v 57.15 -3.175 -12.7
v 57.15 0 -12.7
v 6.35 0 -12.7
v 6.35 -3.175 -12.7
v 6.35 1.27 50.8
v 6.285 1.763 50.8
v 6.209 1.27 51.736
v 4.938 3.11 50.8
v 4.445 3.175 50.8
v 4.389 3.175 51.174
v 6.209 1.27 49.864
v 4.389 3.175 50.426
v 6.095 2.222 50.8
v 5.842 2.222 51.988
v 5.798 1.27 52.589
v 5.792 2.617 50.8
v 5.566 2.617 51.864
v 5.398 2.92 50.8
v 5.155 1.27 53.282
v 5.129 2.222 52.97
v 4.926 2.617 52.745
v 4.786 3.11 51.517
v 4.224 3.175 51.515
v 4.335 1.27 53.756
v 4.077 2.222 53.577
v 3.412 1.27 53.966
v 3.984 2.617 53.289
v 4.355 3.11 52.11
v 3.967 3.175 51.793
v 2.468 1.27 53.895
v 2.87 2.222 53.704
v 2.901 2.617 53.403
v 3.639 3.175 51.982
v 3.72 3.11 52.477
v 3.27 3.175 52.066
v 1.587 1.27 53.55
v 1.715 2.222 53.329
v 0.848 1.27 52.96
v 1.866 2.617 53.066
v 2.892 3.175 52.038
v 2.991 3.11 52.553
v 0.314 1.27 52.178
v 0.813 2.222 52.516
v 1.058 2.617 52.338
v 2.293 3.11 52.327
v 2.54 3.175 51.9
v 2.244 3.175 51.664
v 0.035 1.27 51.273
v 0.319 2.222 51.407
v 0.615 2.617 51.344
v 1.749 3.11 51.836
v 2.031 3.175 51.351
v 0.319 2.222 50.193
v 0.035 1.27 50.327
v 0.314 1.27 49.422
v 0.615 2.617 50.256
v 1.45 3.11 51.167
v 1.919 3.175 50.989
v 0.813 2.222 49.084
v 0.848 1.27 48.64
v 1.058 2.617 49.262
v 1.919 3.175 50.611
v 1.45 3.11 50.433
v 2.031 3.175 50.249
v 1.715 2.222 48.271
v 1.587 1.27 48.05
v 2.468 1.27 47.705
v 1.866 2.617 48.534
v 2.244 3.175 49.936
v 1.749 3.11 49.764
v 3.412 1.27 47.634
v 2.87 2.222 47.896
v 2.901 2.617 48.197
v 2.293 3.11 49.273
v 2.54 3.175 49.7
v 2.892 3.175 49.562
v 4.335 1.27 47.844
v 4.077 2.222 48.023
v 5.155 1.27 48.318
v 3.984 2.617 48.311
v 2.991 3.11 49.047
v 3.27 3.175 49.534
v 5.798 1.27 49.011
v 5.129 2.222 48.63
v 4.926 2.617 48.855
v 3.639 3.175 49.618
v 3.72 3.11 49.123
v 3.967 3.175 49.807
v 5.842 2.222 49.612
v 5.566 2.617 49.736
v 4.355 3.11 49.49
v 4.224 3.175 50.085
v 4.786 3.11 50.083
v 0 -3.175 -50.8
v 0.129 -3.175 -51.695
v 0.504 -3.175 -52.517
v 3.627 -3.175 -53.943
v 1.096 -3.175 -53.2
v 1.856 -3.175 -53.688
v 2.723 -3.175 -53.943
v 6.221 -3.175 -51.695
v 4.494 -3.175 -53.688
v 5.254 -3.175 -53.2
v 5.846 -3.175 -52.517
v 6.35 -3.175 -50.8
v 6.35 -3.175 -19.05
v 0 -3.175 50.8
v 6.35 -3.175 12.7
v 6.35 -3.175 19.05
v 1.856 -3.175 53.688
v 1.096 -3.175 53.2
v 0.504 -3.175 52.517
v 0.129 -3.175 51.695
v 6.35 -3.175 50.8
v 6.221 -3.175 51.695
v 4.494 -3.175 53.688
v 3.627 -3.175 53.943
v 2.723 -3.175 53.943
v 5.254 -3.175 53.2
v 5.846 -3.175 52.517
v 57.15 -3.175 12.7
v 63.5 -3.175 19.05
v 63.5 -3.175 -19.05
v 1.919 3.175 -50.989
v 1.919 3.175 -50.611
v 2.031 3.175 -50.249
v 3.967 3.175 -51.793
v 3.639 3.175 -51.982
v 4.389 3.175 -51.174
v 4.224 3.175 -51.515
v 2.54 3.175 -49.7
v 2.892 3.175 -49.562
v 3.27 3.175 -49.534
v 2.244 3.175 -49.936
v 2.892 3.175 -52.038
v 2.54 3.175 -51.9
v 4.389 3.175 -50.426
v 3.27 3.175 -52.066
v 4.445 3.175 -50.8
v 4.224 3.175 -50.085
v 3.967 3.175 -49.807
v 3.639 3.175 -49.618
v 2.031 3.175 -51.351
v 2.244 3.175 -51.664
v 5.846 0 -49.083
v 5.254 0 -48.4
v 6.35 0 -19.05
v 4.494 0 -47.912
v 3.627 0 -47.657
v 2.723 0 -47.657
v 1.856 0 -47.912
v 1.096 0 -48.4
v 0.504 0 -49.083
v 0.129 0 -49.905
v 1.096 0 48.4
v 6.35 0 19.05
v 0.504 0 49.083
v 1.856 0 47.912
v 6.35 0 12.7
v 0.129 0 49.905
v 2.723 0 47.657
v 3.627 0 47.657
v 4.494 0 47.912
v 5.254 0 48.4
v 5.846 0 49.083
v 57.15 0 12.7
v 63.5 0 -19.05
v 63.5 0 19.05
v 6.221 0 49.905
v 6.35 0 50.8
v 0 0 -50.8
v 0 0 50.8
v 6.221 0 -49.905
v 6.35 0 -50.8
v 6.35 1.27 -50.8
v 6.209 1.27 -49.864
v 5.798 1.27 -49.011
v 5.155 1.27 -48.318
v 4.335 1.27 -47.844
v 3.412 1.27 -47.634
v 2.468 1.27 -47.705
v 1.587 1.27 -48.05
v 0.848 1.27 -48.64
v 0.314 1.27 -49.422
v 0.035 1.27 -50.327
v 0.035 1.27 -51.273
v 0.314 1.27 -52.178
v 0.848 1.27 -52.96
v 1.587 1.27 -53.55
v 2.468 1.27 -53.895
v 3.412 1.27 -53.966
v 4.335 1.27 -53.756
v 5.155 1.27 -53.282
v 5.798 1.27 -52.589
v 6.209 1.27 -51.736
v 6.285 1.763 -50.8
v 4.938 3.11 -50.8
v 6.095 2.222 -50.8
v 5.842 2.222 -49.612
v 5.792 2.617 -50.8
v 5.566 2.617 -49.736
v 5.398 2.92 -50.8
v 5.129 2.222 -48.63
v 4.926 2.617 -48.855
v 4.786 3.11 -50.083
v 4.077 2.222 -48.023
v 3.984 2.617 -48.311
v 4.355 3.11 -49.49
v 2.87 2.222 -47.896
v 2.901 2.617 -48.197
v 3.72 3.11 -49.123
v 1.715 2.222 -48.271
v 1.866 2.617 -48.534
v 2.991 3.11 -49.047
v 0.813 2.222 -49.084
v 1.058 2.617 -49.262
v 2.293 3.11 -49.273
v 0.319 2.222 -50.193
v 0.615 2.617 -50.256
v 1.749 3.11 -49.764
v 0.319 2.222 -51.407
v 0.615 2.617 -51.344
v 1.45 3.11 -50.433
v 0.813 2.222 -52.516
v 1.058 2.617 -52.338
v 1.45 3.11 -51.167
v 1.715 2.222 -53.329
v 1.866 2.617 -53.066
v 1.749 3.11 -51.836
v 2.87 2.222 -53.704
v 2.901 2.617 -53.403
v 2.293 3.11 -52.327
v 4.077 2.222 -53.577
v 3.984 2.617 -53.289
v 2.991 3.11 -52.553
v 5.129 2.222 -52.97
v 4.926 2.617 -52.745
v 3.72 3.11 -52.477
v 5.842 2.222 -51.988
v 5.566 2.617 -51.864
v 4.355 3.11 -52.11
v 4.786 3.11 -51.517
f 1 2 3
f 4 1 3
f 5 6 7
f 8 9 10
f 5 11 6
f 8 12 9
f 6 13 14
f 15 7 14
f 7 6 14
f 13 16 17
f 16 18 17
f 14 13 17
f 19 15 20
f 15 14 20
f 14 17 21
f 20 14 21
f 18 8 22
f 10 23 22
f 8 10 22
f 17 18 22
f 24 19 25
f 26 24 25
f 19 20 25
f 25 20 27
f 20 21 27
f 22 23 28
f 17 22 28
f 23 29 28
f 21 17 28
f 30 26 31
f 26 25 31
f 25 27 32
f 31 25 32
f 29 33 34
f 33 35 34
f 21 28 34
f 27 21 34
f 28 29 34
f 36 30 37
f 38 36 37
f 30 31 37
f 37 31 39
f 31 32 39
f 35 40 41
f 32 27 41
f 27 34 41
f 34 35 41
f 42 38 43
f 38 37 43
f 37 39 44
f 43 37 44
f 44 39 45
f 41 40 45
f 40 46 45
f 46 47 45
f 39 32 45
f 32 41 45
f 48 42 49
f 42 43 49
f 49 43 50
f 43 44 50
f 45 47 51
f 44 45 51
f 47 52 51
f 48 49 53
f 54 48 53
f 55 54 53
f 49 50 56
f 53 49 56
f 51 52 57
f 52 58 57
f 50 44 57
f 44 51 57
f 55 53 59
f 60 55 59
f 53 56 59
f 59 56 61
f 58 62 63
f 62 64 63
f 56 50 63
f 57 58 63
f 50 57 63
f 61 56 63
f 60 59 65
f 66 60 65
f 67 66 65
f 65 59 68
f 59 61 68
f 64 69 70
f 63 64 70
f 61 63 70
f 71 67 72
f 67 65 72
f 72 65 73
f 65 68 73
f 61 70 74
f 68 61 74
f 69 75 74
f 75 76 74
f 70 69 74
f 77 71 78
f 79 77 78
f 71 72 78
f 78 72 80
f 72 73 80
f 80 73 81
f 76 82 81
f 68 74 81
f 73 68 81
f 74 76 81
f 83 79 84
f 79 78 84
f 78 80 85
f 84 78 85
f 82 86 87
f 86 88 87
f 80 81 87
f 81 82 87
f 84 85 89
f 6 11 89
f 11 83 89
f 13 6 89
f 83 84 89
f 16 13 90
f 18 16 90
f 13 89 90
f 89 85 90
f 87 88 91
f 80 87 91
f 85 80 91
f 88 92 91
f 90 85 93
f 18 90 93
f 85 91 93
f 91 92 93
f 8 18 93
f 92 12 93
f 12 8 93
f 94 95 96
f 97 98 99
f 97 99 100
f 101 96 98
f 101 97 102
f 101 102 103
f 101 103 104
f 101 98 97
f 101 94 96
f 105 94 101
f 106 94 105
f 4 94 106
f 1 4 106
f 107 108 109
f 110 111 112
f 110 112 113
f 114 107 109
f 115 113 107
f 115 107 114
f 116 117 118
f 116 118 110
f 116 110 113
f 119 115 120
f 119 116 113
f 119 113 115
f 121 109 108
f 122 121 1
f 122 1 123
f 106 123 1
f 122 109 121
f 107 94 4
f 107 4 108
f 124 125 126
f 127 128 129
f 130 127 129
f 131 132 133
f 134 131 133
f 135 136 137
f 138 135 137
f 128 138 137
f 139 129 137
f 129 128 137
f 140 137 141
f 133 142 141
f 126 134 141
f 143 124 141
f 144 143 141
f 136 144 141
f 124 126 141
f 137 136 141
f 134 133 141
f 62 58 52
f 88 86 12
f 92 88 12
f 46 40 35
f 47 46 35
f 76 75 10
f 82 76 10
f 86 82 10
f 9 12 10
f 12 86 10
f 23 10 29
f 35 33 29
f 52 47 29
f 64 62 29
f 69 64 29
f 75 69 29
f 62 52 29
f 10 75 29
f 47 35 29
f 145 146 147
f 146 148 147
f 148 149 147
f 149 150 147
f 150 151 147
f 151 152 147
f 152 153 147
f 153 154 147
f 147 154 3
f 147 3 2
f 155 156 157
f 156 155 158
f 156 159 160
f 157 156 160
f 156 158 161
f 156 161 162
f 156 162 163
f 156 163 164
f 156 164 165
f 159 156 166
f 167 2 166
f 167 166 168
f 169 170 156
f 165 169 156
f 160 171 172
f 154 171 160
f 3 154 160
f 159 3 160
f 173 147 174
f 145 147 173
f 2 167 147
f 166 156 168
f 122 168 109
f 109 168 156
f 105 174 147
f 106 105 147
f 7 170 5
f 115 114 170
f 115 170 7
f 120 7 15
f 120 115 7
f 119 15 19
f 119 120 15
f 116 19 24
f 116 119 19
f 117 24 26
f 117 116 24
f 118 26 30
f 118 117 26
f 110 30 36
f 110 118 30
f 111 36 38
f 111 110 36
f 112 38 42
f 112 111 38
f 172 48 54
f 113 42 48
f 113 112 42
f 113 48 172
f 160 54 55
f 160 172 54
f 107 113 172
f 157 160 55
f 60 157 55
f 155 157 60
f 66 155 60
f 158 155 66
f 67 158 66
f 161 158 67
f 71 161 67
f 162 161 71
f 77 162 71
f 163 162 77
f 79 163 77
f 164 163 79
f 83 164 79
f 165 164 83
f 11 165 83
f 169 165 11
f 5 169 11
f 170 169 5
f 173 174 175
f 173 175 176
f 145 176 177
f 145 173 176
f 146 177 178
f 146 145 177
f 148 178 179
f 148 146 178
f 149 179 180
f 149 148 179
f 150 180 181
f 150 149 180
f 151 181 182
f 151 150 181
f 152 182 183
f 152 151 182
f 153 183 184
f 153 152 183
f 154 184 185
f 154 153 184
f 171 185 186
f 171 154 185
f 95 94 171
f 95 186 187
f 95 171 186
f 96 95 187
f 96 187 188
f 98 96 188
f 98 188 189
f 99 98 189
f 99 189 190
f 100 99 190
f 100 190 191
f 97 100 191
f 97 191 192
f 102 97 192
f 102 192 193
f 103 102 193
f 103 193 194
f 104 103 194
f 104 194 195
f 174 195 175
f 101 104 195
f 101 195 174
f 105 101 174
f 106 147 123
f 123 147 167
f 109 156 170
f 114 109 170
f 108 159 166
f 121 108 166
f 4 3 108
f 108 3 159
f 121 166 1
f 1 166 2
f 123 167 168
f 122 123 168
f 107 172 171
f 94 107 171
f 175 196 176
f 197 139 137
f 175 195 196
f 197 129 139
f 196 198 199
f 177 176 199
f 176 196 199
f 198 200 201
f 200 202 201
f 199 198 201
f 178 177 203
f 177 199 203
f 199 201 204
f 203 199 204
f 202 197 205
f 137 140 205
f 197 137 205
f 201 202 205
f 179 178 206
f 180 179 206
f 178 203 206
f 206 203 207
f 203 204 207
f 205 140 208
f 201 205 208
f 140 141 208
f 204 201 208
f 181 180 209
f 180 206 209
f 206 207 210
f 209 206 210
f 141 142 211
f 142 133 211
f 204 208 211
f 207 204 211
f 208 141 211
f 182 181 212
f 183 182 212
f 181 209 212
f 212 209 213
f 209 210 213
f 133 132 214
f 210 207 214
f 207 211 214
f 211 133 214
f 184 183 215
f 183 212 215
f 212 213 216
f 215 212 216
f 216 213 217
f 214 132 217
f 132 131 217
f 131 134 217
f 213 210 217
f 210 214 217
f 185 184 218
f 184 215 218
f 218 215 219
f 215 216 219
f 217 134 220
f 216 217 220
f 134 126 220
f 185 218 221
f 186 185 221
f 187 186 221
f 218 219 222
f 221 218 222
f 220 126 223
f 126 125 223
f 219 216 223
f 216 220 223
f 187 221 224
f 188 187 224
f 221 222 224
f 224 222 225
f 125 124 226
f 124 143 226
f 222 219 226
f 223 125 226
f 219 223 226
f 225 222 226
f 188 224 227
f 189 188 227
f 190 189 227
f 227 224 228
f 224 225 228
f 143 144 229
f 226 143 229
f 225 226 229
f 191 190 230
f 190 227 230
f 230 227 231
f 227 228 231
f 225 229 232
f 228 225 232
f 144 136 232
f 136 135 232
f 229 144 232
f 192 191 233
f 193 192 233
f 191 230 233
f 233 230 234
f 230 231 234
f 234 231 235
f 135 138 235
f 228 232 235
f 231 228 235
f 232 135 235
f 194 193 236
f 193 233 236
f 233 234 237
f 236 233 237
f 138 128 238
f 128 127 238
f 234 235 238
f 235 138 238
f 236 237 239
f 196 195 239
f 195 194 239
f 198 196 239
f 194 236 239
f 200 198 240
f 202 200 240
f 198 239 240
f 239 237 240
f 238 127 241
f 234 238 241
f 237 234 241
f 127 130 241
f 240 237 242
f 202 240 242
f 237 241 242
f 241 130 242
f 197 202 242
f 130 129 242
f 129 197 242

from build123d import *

# Parameters (mm, degrees)
F0_DEPTH = 3.175
F1_R     = 3.175
F4_DEPTH = 6.35
F2_R     = 1.905


# Not quite as in the source:
# - a length typed as a fraction of an inch, garbled in the dataset ("3 / 203.2 mm" for 3/8 in), is restored


with BuildPart() as f0:
    # F3 (on Front) → F0 (new body)
    with BuildSketch(Plane.XZ):
        Polygon((6.35, 50.8), (0, 50.8), (0, 0), (0, -50.8), (6.35, -50.8), (6.35, -19.05), (63.5, -19.05), (63.5, 19.05), (6.35, 19.05), align=None)
        Polygon((6.35, -12.7), (6.35, 0), (6.35, 12.7), (57.15, 12.7), (57.15, -12.7), align=None, mode=Mode.SUBTRACT)
    extrude(amount=F0_DEPTH)

    # F1 (on face) → F4 (join)
    with BuildSketch(Plane.XZ.offset(3.175)):
        with Locations((3.175, -50.8)):
            Circle(F1_R)
        with Locations((3.175, 50.8)):
            Circle(F1_R)
    extrude(amount=-F4_DEPTH)

    # F2
    f2_edges = [f0.edges().sort_by_distance(p)[0] for p in [
        (0, 3.175, 50.8),
        (0, 3.175, -50.8),
    ]]
    fillet(f2_edges, radius=F2_R)


solid = f0.part
